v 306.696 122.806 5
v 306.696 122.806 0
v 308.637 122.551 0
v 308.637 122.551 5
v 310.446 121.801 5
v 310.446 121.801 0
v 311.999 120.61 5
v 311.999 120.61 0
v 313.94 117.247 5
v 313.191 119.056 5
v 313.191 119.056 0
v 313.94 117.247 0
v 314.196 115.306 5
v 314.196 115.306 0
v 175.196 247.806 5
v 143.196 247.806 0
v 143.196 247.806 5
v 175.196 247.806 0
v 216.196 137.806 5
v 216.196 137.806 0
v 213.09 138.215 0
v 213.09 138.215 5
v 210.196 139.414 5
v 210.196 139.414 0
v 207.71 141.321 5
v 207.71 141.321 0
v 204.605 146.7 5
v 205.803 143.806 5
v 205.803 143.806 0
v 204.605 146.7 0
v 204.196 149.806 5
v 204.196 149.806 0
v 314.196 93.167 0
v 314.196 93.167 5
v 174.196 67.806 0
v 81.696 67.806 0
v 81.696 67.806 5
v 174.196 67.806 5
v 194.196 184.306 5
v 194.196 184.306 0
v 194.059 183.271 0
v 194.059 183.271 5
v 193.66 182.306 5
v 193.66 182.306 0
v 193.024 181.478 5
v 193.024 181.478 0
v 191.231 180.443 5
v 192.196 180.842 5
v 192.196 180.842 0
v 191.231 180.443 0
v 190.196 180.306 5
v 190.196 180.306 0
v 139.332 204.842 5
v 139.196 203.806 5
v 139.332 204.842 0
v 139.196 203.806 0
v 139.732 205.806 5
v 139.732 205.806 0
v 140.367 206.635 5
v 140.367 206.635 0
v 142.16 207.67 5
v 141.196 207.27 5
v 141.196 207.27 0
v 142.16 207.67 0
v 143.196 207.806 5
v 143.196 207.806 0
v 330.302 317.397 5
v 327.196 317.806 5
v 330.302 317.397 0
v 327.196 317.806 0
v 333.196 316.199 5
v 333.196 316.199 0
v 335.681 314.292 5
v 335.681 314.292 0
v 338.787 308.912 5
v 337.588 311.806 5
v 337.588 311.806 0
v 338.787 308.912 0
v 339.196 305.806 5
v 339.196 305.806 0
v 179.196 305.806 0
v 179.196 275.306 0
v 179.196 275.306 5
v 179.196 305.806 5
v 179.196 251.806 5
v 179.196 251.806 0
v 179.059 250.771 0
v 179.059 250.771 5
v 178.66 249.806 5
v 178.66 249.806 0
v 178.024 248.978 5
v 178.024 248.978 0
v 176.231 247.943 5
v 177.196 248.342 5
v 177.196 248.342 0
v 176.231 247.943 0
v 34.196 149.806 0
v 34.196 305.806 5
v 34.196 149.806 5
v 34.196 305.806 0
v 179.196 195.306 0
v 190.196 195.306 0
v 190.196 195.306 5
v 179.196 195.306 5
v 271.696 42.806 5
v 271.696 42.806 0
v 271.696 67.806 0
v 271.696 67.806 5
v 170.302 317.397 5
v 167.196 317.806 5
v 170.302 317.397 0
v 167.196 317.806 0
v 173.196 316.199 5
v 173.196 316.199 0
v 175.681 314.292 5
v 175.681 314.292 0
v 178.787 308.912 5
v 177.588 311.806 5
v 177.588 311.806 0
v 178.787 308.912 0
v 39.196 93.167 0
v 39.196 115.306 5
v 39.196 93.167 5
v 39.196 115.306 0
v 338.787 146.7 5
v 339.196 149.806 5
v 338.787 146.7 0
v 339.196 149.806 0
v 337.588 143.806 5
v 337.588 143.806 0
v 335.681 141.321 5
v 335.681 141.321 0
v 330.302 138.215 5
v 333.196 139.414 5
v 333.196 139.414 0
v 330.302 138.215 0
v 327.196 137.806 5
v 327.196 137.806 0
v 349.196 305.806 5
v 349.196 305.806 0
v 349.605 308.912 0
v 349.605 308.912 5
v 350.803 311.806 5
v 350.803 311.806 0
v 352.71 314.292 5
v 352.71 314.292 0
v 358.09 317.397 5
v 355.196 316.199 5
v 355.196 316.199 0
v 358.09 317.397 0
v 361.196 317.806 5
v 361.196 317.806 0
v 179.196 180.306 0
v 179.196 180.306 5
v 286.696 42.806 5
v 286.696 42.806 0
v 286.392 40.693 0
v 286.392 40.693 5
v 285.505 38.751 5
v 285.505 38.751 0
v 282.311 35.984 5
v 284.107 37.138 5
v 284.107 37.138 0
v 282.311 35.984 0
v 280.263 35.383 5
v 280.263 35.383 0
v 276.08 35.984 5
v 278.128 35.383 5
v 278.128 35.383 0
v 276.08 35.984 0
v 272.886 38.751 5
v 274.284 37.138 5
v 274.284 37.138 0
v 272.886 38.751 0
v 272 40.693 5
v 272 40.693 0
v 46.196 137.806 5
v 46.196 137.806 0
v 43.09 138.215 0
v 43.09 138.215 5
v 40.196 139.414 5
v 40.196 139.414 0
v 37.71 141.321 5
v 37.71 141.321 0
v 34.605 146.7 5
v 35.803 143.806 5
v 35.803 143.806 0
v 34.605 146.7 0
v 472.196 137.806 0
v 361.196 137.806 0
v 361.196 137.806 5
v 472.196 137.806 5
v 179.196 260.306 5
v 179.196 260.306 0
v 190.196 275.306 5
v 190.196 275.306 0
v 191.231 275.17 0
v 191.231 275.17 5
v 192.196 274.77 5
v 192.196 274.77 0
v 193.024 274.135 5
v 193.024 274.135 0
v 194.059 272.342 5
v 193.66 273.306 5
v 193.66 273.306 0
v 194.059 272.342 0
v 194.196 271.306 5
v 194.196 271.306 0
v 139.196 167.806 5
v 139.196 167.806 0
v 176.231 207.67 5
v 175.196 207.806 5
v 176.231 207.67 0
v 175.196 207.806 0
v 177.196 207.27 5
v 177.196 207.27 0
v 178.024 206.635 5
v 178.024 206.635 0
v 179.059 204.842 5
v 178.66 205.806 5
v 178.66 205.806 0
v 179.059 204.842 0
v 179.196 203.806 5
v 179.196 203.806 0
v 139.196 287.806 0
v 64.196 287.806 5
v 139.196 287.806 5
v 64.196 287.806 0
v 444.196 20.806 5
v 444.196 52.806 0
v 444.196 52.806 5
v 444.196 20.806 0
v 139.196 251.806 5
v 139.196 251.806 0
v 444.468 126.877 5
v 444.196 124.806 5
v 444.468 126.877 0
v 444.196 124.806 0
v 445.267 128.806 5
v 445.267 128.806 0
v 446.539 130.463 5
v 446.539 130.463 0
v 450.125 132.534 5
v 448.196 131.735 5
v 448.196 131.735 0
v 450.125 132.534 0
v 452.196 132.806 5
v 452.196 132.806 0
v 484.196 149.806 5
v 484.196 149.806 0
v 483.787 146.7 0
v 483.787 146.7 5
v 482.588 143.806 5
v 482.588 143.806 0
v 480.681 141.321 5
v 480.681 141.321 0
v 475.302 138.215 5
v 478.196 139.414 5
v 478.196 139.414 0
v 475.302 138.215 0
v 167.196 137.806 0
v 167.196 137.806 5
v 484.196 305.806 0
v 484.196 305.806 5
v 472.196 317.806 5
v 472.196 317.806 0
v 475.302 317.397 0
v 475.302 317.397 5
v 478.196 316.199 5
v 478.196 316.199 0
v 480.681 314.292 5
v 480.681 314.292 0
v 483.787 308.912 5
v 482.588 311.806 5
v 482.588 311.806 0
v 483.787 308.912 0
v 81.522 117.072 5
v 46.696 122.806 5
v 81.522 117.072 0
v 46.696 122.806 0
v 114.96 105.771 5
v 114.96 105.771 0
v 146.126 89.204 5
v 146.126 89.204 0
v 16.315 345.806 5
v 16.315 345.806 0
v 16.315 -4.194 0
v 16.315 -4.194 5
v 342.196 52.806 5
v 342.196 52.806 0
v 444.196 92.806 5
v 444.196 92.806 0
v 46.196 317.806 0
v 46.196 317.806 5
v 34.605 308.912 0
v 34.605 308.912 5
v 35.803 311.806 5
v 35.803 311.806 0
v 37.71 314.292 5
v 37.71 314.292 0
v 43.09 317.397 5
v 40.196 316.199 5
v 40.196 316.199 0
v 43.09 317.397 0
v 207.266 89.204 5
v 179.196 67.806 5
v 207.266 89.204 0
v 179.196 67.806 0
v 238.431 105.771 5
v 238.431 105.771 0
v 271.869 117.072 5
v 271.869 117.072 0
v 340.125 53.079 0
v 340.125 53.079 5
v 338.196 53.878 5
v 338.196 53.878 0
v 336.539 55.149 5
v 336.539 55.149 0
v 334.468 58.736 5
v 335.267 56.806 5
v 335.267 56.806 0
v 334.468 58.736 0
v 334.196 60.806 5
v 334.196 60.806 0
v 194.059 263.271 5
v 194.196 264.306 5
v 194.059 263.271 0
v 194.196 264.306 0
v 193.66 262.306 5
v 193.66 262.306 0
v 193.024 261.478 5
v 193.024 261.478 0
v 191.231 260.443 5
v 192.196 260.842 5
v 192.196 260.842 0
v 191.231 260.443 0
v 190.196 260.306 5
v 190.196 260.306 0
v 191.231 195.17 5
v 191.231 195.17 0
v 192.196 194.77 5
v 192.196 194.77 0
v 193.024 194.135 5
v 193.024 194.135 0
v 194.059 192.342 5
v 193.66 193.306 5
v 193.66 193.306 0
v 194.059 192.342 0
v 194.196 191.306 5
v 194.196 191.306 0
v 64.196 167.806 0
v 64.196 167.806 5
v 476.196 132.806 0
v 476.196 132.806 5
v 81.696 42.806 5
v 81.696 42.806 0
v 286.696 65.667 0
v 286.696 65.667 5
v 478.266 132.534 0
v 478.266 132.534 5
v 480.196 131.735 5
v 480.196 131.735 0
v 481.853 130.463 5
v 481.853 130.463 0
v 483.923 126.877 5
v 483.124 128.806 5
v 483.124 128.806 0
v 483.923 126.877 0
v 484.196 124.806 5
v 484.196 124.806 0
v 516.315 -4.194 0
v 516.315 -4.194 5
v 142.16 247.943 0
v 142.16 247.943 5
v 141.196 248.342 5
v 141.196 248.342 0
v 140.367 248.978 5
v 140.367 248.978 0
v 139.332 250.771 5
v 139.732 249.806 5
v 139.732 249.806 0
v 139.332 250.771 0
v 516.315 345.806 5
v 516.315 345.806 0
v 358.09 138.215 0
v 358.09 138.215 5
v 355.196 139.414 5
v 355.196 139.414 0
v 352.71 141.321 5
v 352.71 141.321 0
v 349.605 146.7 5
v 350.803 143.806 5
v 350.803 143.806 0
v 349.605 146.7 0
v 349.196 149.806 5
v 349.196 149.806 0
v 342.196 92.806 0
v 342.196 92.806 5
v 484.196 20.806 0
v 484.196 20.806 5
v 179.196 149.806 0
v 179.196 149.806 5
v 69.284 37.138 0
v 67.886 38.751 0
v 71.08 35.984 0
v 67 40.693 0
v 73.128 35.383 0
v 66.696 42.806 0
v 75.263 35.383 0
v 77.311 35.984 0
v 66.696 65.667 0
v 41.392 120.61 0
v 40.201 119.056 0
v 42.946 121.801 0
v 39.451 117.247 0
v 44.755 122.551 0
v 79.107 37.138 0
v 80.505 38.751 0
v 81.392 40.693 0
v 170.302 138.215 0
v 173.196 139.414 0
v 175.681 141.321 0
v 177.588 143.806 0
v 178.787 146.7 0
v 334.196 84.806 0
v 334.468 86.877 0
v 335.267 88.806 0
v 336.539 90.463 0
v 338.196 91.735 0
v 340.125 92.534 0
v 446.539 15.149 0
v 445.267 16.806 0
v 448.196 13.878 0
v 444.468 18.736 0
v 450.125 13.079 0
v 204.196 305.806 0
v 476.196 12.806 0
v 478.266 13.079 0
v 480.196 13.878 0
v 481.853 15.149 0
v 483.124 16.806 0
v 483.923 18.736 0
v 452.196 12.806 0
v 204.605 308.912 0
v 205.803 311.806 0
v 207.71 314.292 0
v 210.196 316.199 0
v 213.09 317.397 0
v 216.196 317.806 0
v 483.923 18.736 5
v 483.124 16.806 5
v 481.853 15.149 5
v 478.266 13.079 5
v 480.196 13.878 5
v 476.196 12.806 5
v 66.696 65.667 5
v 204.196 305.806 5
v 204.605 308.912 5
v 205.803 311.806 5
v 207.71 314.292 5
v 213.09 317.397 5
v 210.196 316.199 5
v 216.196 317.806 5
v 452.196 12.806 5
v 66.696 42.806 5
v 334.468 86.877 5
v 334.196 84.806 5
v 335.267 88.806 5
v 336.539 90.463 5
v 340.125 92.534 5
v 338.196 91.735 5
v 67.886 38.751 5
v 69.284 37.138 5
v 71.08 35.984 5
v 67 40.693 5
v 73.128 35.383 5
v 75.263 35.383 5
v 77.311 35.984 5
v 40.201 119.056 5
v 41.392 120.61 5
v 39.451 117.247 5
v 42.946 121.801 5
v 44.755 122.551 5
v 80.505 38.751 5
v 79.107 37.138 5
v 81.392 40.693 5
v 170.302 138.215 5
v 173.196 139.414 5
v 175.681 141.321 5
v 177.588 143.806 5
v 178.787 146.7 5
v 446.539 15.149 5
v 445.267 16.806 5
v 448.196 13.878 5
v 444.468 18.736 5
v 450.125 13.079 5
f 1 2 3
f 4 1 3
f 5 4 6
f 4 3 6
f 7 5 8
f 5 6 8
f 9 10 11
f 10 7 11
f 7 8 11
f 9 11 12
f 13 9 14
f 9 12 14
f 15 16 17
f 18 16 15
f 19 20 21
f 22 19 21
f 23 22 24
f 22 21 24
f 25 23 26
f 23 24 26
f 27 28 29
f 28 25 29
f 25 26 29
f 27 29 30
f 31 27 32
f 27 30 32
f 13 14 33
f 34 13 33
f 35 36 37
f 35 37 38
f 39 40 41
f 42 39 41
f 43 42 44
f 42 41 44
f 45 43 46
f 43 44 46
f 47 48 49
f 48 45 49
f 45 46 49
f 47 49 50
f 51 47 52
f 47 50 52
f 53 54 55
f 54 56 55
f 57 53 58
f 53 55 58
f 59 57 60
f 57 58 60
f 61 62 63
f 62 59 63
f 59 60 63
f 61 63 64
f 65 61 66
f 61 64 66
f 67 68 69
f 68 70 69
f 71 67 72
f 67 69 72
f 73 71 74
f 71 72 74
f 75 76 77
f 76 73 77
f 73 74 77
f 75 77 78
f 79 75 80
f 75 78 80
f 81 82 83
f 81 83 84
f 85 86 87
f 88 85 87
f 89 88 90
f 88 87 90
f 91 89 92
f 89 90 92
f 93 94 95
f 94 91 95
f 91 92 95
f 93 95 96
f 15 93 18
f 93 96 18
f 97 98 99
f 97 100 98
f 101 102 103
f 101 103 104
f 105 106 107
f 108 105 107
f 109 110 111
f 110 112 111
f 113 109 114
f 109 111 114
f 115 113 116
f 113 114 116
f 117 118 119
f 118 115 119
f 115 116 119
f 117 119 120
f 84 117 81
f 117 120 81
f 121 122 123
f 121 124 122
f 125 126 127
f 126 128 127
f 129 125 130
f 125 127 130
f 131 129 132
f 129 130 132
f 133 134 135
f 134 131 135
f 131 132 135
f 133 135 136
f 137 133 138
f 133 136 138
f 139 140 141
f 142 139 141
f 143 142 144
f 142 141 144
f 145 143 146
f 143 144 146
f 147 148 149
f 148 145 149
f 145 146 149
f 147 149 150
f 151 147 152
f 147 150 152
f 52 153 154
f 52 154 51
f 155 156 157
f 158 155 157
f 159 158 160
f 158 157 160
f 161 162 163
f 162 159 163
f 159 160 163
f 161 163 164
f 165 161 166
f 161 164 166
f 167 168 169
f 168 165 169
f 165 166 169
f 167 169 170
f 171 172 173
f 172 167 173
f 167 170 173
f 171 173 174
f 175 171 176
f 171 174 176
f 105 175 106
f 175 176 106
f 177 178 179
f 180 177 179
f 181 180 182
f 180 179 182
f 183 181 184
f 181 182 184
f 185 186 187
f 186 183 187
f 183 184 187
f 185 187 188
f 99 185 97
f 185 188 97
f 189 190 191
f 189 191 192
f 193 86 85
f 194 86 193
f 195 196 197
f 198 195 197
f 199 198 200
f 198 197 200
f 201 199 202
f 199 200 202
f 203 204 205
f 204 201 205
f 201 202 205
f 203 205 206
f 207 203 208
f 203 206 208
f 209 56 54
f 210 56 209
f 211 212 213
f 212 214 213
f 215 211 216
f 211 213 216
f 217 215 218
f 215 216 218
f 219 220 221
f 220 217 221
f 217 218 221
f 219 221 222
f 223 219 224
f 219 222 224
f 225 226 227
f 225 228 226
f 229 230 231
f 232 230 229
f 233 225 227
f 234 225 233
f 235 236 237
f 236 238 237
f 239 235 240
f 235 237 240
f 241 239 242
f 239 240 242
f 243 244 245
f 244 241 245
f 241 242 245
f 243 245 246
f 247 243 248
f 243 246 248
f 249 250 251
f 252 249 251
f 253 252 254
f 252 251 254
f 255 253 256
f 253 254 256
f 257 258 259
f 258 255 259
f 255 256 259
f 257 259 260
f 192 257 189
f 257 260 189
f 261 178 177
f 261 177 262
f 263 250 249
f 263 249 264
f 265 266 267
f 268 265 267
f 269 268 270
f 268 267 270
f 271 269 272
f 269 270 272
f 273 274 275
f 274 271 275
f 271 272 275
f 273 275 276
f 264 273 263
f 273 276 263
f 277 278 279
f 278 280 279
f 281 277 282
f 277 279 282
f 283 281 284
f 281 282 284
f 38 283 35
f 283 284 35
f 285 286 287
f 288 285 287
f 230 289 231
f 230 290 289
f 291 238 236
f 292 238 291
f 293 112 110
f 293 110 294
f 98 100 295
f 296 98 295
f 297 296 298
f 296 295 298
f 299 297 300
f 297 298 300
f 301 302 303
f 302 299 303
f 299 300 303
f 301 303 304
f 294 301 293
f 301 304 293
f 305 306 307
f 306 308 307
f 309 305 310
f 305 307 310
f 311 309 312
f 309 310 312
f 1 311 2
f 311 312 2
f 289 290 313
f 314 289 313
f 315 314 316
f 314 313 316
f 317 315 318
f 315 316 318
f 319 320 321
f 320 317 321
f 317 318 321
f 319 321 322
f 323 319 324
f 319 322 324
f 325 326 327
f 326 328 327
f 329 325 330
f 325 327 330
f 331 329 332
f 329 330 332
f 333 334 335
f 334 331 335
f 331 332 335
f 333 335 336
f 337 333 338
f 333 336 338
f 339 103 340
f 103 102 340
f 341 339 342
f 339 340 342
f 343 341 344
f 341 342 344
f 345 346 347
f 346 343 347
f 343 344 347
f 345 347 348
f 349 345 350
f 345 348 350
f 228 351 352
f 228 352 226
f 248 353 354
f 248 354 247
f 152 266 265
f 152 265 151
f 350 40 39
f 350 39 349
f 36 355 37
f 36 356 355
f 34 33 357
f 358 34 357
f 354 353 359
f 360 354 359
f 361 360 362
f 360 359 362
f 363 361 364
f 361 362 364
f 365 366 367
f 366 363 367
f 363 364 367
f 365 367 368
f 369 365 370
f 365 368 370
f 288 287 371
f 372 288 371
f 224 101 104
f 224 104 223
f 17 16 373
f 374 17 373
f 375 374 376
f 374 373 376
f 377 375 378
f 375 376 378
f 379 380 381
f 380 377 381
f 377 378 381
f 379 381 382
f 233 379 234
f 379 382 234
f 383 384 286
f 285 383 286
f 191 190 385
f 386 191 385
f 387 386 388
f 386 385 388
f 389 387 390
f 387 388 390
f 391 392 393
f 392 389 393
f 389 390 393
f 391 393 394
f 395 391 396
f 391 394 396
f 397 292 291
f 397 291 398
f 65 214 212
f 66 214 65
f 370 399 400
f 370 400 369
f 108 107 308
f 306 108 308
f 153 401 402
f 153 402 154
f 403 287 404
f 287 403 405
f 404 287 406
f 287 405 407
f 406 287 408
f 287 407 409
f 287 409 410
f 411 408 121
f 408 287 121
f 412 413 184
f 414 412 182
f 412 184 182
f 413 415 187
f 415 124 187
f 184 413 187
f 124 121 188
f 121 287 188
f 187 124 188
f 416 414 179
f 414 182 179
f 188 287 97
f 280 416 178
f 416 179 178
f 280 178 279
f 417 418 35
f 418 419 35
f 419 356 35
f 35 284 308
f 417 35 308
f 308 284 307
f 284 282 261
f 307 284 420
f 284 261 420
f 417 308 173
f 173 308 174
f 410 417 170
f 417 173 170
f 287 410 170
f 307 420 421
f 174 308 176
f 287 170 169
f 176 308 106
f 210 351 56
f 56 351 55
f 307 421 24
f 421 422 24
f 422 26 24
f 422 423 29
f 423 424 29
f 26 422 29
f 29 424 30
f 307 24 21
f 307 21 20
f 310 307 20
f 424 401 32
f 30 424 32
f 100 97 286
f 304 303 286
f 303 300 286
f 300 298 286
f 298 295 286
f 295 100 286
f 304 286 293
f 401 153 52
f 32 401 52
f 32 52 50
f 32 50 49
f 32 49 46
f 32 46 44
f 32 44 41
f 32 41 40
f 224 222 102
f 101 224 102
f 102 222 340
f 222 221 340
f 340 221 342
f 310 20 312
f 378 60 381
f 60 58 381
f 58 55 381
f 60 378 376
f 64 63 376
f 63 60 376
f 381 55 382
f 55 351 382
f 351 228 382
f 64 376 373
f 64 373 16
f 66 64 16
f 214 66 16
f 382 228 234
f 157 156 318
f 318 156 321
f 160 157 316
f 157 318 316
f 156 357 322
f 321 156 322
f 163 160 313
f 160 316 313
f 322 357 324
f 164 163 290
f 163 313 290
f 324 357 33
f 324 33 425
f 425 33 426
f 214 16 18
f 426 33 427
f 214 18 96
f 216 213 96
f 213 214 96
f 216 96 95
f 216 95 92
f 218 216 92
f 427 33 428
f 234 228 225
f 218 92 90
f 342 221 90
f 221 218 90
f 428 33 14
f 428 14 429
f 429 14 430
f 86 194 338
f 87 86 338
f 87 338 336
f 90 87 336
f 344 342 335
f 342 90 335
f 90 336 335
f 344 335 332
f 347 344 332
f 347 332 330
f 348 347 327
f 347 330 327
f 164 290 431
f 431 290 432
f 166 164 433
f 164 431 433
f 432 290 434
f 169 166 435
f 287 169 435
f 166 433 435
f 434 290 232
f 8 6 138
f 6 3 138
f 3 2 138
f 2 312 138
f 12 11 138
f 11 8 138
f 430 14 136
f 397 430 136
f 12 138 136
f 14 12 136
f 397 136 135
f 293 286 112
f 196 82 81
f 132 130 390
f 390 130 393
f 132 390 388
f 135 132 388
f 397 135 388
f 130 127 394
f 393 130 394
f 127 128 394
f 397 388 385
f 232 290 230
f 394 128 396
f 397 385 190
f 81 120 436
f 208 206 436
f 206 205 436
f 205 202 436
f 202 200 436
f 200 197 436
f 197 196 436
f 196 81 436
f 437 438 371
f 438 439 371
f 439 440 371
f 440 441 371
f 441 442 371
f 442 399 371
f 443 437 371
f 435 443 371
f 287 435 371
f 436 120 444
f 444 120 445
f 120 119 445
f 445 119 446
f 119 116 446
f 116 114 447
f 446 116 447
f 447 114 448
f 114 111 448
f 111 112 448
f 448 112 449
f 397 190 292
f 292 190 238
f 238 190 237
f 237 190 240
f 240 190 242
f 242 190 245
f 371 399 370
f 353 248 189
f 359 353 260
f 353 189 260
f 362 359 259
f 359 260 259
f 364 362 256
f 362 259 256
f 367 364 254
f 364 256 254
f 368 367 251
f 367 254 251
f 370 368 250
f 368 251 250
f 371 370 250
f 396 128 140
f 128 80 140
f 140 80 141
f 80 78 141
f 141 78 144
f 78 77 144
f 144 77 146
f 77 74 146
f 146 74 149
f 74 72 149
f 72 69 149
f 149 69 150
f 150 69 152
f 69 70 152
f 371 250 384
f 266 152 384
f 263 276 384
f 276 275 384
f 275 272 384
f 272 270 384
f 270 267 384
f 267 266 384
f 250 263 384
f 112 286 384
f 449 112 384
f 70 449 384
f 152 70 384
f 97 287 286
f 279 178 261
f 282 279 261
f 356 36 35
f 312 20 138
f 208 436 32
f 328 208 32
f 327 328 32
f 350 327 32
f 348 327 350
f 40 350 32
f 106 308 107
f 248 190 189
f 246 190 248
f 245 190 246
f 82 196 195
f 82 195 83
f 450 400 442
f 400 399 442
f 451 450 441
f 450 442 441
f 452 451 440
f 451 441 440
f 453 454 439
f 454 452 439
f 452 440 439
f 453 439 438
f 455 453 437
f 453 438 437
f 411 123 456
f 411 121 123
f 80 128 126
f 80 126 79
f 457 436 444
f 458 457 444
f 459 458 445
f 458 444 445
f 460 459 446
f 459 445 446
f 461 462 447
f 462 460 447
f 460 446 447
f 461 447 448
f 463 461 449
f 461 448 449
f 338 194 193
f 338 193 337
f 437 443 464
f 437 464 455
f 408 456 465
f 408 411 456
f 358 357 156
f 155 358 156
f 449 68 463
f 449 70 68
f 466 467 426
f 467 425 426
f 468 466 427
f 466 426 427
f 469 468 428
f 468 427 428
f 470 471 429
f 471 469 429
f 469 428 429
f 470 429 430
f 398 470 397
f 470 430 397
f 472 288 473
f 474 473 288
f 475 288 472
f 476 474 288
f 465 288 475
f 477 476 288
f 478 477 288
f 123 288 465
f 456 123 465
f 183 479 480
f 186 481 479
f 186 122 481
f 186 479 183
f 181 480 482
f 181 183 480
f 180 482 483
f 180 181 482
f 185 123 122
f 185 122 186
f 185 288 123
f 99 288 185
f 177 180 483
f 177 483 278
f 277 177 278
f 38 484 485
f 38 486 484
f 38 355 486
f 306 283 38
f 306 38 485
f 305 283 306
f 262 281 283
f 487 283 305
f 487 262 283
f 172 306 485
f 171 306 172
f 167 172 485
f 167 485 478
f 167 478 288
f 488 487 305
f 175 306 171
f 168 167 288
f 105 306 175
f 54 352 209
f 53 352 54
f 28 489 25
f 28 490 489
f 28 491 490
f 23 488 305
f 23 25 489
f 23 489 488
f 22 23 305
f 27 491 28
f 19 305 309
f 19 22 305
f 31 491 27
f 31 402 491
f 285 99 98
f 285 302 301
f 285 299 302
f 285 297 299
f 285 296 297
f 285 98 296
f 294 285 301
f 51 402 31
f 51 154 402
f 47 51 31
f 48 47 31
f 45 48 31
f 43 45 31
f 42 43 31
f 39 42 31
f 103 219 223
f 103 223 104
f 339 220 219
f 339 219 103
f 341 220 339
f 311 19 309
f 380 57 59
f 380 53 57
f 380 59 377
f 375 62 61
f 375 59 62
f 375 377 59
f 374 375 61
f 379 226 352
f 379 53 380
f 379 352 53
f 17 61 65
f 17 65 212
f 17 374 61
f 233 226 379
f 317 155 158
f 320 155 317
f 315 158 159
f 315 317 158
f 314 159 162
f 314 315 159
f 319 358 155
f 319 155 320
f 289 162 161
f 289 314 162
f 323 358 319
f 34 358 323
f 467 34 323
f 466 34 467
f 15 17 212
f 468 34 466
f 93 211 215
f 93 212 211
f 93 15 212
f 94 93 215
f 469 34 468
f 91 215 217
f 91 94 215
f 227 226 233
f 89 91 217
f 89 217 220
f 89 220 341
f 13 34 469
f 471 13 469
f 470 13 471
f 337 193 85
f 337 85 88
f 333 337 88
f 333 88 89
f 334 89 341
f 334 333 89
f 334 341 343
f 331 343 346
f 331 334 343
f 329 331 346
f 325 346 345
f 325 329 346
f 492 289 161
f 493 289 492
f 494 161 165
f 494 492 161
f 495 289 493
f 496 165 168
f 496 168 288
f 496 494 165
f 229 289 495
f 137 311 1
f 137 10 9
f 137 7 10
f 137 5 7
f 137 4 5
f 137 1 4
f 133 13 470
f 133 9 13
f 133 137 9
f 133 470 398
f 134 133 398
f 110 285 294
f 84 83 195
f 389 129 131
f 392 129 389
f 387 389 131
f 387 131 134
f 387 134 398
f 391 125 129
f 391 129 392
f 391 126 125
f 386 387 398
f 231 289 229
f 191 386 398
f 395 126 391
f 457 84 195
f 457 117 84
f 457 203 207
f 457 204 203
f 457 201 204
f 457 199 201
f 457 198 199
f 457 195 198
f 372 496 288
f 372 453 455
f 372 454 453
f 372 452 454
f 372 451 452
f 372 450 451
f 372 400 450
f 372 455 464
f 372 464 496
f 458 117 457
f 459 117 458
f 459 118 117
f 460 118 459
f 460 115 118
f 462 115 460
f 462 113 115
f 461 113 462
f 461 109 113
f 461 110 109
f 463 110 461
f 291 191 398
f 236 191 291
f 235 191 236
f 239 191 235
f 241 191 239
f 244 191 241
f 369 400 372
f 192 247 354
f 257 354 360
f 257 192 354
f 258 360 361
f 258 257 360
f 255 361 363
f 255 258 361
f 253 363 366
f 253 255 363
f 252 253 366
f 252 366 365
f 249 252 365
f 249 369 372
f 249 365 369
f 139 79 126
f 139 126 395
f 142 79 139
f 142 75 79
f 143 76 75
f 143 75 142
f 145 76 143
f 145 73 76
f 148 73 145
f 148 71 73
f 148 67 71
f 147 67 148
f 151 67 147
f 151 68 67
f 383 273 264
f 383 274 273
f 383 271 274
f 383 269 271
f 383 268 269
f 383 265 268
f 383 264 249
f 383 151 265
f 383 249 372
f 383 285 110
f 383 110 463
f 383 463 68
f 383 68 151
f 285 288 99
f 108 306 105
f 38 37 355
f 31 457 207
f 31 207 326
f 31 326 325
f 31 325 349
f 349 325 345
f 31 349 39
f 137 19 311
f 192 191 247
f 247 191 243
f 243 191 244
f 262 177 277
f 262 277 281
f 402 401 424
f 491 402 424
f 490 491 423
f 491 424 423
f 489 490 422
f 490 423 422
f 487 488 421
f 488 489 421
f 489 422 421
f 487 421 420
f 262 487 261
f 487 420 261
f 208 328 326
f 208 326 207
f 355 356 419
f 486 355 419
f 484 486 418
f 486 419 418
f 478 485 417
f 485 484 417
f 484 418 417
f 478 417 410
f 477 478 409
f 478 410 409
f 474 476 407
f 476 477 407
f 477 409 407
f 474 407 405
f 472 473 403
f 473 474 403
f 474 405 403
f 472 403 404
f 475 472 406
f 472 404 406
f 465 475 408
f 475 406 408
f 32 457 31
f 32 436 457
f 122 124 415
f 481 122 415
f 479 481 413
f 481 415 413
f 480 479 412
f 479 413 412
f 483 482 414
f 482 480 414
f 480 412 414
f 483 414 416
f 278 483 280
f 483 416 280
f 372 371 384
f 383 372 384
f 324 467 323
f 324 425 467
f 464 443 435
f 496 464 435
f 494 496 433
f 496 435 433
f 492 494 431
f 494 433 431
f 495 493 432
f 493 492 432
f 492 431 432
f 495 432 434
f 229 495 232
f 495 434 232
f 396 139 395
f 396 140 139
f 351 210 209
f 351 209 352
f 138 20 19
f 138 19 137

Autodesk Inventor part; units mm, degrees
ref_plane "YZ Plane" through (0, 0, 0) normal (1, 0, 0) x (0, 1, 0)
ref_plane "XZ Plane" through (0, 0, 0) normal (0, 1, 0) x (-1, 0, 0)
ref_plane "XY Plane" through (0, 0, 0) normal (0, 0, 1) x (1, 0, 0)
sketch "Sketch1" plane through (0, 0, 0) normal (0, 0, 1) x (1, 0, 0)
  arc A0 (70.6957, 42.8063) -> (77.6957, 42.8063) centre (74.1957, 42.8063) ccw
  line L0 (66.6957, 65.6673) -> (66.6957, 42.8063)
  line L1 (39.1957, 93.1673) -> (66.6957, 65.6673)
  line L2 (39.1957, 115.3063) -> (39.1957, 93.1673)
  arc A1 (46.6957, 122.8063) -> (39.1957, 115.3063) centre (46.6957, 115.3063) ccw
  arc A2 (174.1957, 67.8063) -> (46.6957, 122.8063) centre (28.9415, -93.6352) ccw
  line L3 (81.6957, 67.8063) -> (174.1957, 67.8063)
  line L4 (81.6957, 42.8063) -> (81.6957, 67.8063)
  arc A3 (66.6957, 42.8063) -> (81.6957, 42.8063) centre (74.1957, 42.8063) ccw
  circle A4 centre (299.1957, 107.8063) radius 3.5
  line L5 (275.6957, 67.8063) -> (275.6957, 42.8063)
  arc A5 (282.6957, 67.8063) -> (275.6957, 67.8063) centre (279.1957, 67.8063) ccw
  line L6 (282.6957, 42.8063) -> (282.6957, 67.8063)
  arc A6 (275.6957, 42.8063) -> (282.6957, 42.8063) centre (279.1957, 42.8063) ccw
  line L7 (286.6957, 65.6673) -> (286.6957, 42.8063)
  line L8 (314.1957, 93.1673) -> (286.6957, 65.6673)
  line L9 (314.1957, 115.3063) -> (314.1957, 93.1673)
  arc A7 (314.1957, 115.3063) -> (306.6957, 122.8063) centre (306.6957, 115.3063) ccw
  arc A8 (306.6957, 122.8063) -> (179.1957, 67.8063) centre (324.4499, -93.6352) ccw
  line L10 (271.6957, 67.8063) -> (179.1957, 67.8063)
  line L11 (271.6957, 42.8063) -> (271.6957, 67.8063)
  arc A9 (271.6957, 42.8063) -> (286.6957, 42.8063) centre (279.1957, 42.8063) ccw
  circle A10 centre (324.1957, 152.8063) radius 3.5
  circle A11 centre (219.1957, 302.8063) radius 3.5
  circle A12 centre (324.1957, 302.8063) radius 3.5
  circle A13 centre (219.1957, 152.8063) radius 3.5
  line L12 (234.1957, 177.8063) -> (234.1957, 277.8063)
  line L13 (309.1957, 177.8063) -> (234.1957, 177.8063)
  line L14 (309.1957, 277.8063) -> (309.1957, 177.8063)
  line L15 (234.1957, 277.8063) -> (309.1957, 277.8063)
  arc A14 (204.1957, 149.8063) -> (216.1957, 137.8063) centre (216.1957, 149.8063) ccw
  line L16 (204.1957, 305.8063) -> (204.1957, 149.8063)
  arc A15 (216.1957, 317.8063) -> (204.1957, 305.8063) centre (216.1957, 305.8063) ccw
  line L17 (327.1957, 317.8063) -> (216.1957, 317.8063)
  arc A16 (339.1957, 305.8063) -> (327.1957, 317.8063) centre (327.1957, 305.8063) ccw
  line L18 (339.1957, 149.8063) -> (339.1957, 305.8063)
  arc A17 (327.1957, 137.8063) -> (339.1957, 149.8063) centre (327.1957, 149.8063) ccw
  line L19 (216.1957, 137.8063) -> (327.1957, 137.8063)
  circle A18 centre (469.1957, 152.8063) radius 3.5
  circle A19 centre (364.1957, 302.8063) radius 3.5
  circle A20 centre (469.1957, 302.8063) radius 3.5
  circle A21 centre (364.1957, 152.8063) radius 3.5
  line L20 (379.1957, 177.8063) -> (379.1957, 277.8063)
  line L21 (454.1957, 177.8063) -> (379.1957, 177.8063)
  line L22 (454.1957, 277.8063) -> (454.1957, 177.8063)
  line L23 (379.1957, 277.8063) -> (454.1957, 277.8063)
  arc A22 (349.1957, 149.8063) -> (361.1957, 137.8063) centre (361.1957, 149.8063) ccw
  line L24 (349.1957, 305.8063) -> (349.1957, 149.8063)
  arc A23 (361.1957, 317.8063) -> (349.1957, 305.8063) centre (361.1957, 305.8063) ccw
  line L25 (472.1957, 317.8063) -> (361.1957, 317.8063)
  arc A24 (484.1957, 305.8063) -> (472.1957, 317.8063) centre (472.1957, 305.8063) ccw
  line L26 (484.1957, 149.8063) -> (484.1957, 305.8063)
  arc A25 (472.1957, 137.8063) -> (484.1957, 149.8063) centre (472.1957, 149.8063) ccw
  line L27 (361.1957, 137.8063) -> (472.1957, 137.8063)
  circle A26 centre (154.1957, 152.8063) radius 3.5
  circle A27 centre (49.1957, 302.8063) radius 3.5
  circle A28 centre (49.1957, 152.8063) radius 3.5
  circle A29 centre (154.1957, 302.8063) radius 3.5
  circle A30 centre (186.6957, 267.8063) radius 3.5
  circle A31 centre (186.6957, 187.8063) radius 3.5
  arc A32 (139.1957, 251.8063) -> (143.1957, 247.8063) centre (143.1957, 251.8063) ccw
  line L28 (139.1957, 287.8063) -> (139.1957, 251.8063)
  line L29 (64.1957, 287.8063) -> (139.1957, 287.8063)
  line L30 (64.1957, 167.8063) -> (64.1957, 287.8063)
  line L31 (139.1957, 167.8063) -> (64.1957, 167.8063)
  line L32 (139.1957, 203.8063) -> (139.1957, 167.8063)
  arc A33 (143.1957, 207.8063) -> (139.1957, 203.8063) centre (143.1957, 203.8063) ccw
  line L33 (175.1957, 207.8063) -> (143.1957, 207.8063)
  arc A34 (179.1957, 203.8063) -> (175.1957, 207.8063) centre (175.1957, 203.8063) ccw
  line L34 (179.1957, 195.3063) -> (179.1957, 203.8063)
  line L35 (190.1957, 195.3063) -> (179.1957, 195.3063)
  arc A35 (194.1957, 191.3063) -> (190.1957, 195.3063) centre (190.1957, 191.3063) ccw
  line L36 (194.1957, 184.3063) -> (194.1957, 191.3063)
  arc A36 (190.1957, 180.3063) -> (194.1957, 184.3063) centre (190.1957, 184.3063) ccw
  line L37 (179.1957, 180.3063) -> (190.1957, 180.3063)
  line L38 (179.1957, 149.8063) -> (179.1957, 180.3063)
  arc A37 (167.1957, 137.8063) -> (179.1957, 149.8063) centre (167.1957, 149.8063) ccw
  line L39 (46.1957, 137.8063) -> (167.1957, 137.8063)
  arc A38 (34.1957, 149.8063) -> (46.1957, 137.8063) centre (46.1957, 149.8063) ccw
  line L40 (34.1957, 305.8063) -> (34.1957, 149.8063)
  arc A39 (46.1957, 317.8063) -> (34.1957, 305.8063) centre (46.1957, 305.8063) ccw
  line L41 (167.1957, 317.8063) -> (46.1957, 317.8063)
  circle A40 centre (54.1957, 107.8063) radius 3.5
  line L42 (179.1957, 275.3063) -> (179.1957, 305.8063)
  line L43 (190.1957, 275.3063) -> (179.1957, 275.3063)
  arc A41 (194.1957, 271.3063) -> (190.1957, 275.3063) centre (190.1957, 271.3063) ccw
  line L44 (194.1957, 264.3063) -> (194.1957, 271.3063)
  arc A42 (190.1957, 260.3063) -> (194.1957, 264.3063) centre (190.1957, 264.3063) ccw
  line L45 (179.1957, 260.3063) -> (190.1957, 260.3063)
  line L46 (179.1957, 251.8063) -> (179.1957, 260.3063)
  arc A43 (175.1957, 247.8063) -> (179.1957, 251.8063) centre (175.1957, 251.8063) ccw
  line L47 (143.1957, 247.8063) -> (175.1957, 247.8063)
  circle A44 centre (341.6957, 72.8063) radius 3.5
  arc A45 (484.1957, 124.8063) -> (476.1957, 132.8063) centre (476.1957, 124.8063) ccw
  line L48 (484.1957, 20.8063) -> (484.1957, 124.8063)
  arc A46 (476.1957, 12.8063) -> (484.1957, 20.8063) centre (476.1957, 20.8063) ccw
  arc A47 (179.1957, 305.8063) -> (167.1957, 317.8063) centre (167.1957, 305.8063) ccw
  arc A48 (444.1957, 20.8063) -> (452.1957, 12.8063) centre (452.1957, 20.8063) ccw
  line L49 (444.1957, 52.8063) -> (444.1957, 20.8063)
  line L50 (342.1957, 52.8063) -> (444.1957, 52.8063)
  arc A49 (334.1957, 60.8063) -> (342.1957, 52.8063) centre (342.1957, 60.8063) ccw
  line L51 (334.1957, 84.8063) -> (334.1957, 60.8063)
  arc A50 (342.1957, 92.8063) -> (334.1957, 84.8063) centre (342.1957, 84.8063) ccw
  line L52 (444.1957, 92.8063) -> (342.1957, 92.8063)
  line L53 (444.1957, 124.8063) -> (444.1957, 92.8063)
  arc A51 (452.1957, 132.8063) -> (444.1957, 124.8063) centre (452.1957, 124.8063) ccw
  line L54 (476.1957, 132.8063) -> (452.1957, 132.8063)
  line L55 (77.6957, 67.8063) -> (77.6957, 42.8063)
  arc A52 (77.6957, 67.8063) -> (70.6957, 67.8063) centre (74.1957, 67.8063) ccw
  line L56 (70.6957, 42.8063) -> (70.6957, 67.8063)
  line L57 (452.1957, 12.8063) -> (476.1957, 12.8063)
  line L58 (17.0765, 317.8063) -> (487.0765, 317.8063) construction
  line L59 (27.0765, 327.8063) -> (27.0765, 7.8063) construction
  line L60 (17.0765, 17.8063) -> (487.0765, 17.8063) construction
  line L61 (484.1957, 7.8063) -> (484.1957, 327.8063) construction
  line L62 (516.3149, 345.8063) -> (16.3149, 345.8063)
  line L63 (16.3149, 345.8063) -> (16.3149, -4.1937)
  line L64 (16.3149, -4.1937) -> (516.3149, -4.1937)
  line L65 (516.3149, -4.1937) -> (516.3149, 345.8063)
  point P0 (179.1957, 165.0563)
  point P1 (167.0765, 67.8063)
  point P2 (172.0765, 67.8063)
  point P3 (339.1957, 305.8063)
  point P4 (27.0765, 305.8063)
  point P5 (484.1957, 20.8063)
  point P6 (452.1957, 132.8063)
  point P7 (484.1957, 124.8063)
  point P8 (342.1957, 92.8063)
  point P9 (349.1957, 149.8063)
  point P10 (349.1957, 305.8063)
  point P11 (361.1957, 137.8063)
  point P12 (216.1957, 137.8063)
  point P13 (204.1957, 149.8063)
  point P14 (46.1957, 317.8063)
  point P15 (9.1957, 345.8063)
  dimension "d20" = 30
  dimension "d21" = 30
  dimension "d22" = 30
  dimension "d23" = 40
  dimension "d24" = 4
  dimension "d25" = 4
  dimension "d26" = 4
  dimension "d27" = 4
  dimension "d28" = 7
  dimension "d29" = 7
  dimension "d30" = 7
  dimension "d31" = 7
  dimension "d32" = 75
  dimension "d33" = 12
  dimension "d34" = 12
  dimension "d35" = 12
  dimension "d36" = 12
  dimension "d37" = 120
  dimension "d38" = 40
  dimension "d39" = 25
  dimension "d40" = 15
  dimension "d41" = 15
  dimension "d42" = 15
  dimension "d43" = 15
  dimension "d44" = 15
  dimension "d49" = 140
  dimension "d50" = 5
  dimension "d51" = 50
  dimension "d52" = 145
  dimension "d53" = 12
  dimension "d54" = 123
  dimension "d55" = 145
  dimension "d57" = 12
  dimension "d61" = 500
  dimension "d62" = 350
  dimension "d64" = 30
  dimension "d65" = 28
extrude "Extrusion2" add sketch "Sketch1" along normal blind 5 contours L65 L64 L63 L62
properties part number "MarcoRompecabezas" material "MDF Medium Density Fiberboard"
